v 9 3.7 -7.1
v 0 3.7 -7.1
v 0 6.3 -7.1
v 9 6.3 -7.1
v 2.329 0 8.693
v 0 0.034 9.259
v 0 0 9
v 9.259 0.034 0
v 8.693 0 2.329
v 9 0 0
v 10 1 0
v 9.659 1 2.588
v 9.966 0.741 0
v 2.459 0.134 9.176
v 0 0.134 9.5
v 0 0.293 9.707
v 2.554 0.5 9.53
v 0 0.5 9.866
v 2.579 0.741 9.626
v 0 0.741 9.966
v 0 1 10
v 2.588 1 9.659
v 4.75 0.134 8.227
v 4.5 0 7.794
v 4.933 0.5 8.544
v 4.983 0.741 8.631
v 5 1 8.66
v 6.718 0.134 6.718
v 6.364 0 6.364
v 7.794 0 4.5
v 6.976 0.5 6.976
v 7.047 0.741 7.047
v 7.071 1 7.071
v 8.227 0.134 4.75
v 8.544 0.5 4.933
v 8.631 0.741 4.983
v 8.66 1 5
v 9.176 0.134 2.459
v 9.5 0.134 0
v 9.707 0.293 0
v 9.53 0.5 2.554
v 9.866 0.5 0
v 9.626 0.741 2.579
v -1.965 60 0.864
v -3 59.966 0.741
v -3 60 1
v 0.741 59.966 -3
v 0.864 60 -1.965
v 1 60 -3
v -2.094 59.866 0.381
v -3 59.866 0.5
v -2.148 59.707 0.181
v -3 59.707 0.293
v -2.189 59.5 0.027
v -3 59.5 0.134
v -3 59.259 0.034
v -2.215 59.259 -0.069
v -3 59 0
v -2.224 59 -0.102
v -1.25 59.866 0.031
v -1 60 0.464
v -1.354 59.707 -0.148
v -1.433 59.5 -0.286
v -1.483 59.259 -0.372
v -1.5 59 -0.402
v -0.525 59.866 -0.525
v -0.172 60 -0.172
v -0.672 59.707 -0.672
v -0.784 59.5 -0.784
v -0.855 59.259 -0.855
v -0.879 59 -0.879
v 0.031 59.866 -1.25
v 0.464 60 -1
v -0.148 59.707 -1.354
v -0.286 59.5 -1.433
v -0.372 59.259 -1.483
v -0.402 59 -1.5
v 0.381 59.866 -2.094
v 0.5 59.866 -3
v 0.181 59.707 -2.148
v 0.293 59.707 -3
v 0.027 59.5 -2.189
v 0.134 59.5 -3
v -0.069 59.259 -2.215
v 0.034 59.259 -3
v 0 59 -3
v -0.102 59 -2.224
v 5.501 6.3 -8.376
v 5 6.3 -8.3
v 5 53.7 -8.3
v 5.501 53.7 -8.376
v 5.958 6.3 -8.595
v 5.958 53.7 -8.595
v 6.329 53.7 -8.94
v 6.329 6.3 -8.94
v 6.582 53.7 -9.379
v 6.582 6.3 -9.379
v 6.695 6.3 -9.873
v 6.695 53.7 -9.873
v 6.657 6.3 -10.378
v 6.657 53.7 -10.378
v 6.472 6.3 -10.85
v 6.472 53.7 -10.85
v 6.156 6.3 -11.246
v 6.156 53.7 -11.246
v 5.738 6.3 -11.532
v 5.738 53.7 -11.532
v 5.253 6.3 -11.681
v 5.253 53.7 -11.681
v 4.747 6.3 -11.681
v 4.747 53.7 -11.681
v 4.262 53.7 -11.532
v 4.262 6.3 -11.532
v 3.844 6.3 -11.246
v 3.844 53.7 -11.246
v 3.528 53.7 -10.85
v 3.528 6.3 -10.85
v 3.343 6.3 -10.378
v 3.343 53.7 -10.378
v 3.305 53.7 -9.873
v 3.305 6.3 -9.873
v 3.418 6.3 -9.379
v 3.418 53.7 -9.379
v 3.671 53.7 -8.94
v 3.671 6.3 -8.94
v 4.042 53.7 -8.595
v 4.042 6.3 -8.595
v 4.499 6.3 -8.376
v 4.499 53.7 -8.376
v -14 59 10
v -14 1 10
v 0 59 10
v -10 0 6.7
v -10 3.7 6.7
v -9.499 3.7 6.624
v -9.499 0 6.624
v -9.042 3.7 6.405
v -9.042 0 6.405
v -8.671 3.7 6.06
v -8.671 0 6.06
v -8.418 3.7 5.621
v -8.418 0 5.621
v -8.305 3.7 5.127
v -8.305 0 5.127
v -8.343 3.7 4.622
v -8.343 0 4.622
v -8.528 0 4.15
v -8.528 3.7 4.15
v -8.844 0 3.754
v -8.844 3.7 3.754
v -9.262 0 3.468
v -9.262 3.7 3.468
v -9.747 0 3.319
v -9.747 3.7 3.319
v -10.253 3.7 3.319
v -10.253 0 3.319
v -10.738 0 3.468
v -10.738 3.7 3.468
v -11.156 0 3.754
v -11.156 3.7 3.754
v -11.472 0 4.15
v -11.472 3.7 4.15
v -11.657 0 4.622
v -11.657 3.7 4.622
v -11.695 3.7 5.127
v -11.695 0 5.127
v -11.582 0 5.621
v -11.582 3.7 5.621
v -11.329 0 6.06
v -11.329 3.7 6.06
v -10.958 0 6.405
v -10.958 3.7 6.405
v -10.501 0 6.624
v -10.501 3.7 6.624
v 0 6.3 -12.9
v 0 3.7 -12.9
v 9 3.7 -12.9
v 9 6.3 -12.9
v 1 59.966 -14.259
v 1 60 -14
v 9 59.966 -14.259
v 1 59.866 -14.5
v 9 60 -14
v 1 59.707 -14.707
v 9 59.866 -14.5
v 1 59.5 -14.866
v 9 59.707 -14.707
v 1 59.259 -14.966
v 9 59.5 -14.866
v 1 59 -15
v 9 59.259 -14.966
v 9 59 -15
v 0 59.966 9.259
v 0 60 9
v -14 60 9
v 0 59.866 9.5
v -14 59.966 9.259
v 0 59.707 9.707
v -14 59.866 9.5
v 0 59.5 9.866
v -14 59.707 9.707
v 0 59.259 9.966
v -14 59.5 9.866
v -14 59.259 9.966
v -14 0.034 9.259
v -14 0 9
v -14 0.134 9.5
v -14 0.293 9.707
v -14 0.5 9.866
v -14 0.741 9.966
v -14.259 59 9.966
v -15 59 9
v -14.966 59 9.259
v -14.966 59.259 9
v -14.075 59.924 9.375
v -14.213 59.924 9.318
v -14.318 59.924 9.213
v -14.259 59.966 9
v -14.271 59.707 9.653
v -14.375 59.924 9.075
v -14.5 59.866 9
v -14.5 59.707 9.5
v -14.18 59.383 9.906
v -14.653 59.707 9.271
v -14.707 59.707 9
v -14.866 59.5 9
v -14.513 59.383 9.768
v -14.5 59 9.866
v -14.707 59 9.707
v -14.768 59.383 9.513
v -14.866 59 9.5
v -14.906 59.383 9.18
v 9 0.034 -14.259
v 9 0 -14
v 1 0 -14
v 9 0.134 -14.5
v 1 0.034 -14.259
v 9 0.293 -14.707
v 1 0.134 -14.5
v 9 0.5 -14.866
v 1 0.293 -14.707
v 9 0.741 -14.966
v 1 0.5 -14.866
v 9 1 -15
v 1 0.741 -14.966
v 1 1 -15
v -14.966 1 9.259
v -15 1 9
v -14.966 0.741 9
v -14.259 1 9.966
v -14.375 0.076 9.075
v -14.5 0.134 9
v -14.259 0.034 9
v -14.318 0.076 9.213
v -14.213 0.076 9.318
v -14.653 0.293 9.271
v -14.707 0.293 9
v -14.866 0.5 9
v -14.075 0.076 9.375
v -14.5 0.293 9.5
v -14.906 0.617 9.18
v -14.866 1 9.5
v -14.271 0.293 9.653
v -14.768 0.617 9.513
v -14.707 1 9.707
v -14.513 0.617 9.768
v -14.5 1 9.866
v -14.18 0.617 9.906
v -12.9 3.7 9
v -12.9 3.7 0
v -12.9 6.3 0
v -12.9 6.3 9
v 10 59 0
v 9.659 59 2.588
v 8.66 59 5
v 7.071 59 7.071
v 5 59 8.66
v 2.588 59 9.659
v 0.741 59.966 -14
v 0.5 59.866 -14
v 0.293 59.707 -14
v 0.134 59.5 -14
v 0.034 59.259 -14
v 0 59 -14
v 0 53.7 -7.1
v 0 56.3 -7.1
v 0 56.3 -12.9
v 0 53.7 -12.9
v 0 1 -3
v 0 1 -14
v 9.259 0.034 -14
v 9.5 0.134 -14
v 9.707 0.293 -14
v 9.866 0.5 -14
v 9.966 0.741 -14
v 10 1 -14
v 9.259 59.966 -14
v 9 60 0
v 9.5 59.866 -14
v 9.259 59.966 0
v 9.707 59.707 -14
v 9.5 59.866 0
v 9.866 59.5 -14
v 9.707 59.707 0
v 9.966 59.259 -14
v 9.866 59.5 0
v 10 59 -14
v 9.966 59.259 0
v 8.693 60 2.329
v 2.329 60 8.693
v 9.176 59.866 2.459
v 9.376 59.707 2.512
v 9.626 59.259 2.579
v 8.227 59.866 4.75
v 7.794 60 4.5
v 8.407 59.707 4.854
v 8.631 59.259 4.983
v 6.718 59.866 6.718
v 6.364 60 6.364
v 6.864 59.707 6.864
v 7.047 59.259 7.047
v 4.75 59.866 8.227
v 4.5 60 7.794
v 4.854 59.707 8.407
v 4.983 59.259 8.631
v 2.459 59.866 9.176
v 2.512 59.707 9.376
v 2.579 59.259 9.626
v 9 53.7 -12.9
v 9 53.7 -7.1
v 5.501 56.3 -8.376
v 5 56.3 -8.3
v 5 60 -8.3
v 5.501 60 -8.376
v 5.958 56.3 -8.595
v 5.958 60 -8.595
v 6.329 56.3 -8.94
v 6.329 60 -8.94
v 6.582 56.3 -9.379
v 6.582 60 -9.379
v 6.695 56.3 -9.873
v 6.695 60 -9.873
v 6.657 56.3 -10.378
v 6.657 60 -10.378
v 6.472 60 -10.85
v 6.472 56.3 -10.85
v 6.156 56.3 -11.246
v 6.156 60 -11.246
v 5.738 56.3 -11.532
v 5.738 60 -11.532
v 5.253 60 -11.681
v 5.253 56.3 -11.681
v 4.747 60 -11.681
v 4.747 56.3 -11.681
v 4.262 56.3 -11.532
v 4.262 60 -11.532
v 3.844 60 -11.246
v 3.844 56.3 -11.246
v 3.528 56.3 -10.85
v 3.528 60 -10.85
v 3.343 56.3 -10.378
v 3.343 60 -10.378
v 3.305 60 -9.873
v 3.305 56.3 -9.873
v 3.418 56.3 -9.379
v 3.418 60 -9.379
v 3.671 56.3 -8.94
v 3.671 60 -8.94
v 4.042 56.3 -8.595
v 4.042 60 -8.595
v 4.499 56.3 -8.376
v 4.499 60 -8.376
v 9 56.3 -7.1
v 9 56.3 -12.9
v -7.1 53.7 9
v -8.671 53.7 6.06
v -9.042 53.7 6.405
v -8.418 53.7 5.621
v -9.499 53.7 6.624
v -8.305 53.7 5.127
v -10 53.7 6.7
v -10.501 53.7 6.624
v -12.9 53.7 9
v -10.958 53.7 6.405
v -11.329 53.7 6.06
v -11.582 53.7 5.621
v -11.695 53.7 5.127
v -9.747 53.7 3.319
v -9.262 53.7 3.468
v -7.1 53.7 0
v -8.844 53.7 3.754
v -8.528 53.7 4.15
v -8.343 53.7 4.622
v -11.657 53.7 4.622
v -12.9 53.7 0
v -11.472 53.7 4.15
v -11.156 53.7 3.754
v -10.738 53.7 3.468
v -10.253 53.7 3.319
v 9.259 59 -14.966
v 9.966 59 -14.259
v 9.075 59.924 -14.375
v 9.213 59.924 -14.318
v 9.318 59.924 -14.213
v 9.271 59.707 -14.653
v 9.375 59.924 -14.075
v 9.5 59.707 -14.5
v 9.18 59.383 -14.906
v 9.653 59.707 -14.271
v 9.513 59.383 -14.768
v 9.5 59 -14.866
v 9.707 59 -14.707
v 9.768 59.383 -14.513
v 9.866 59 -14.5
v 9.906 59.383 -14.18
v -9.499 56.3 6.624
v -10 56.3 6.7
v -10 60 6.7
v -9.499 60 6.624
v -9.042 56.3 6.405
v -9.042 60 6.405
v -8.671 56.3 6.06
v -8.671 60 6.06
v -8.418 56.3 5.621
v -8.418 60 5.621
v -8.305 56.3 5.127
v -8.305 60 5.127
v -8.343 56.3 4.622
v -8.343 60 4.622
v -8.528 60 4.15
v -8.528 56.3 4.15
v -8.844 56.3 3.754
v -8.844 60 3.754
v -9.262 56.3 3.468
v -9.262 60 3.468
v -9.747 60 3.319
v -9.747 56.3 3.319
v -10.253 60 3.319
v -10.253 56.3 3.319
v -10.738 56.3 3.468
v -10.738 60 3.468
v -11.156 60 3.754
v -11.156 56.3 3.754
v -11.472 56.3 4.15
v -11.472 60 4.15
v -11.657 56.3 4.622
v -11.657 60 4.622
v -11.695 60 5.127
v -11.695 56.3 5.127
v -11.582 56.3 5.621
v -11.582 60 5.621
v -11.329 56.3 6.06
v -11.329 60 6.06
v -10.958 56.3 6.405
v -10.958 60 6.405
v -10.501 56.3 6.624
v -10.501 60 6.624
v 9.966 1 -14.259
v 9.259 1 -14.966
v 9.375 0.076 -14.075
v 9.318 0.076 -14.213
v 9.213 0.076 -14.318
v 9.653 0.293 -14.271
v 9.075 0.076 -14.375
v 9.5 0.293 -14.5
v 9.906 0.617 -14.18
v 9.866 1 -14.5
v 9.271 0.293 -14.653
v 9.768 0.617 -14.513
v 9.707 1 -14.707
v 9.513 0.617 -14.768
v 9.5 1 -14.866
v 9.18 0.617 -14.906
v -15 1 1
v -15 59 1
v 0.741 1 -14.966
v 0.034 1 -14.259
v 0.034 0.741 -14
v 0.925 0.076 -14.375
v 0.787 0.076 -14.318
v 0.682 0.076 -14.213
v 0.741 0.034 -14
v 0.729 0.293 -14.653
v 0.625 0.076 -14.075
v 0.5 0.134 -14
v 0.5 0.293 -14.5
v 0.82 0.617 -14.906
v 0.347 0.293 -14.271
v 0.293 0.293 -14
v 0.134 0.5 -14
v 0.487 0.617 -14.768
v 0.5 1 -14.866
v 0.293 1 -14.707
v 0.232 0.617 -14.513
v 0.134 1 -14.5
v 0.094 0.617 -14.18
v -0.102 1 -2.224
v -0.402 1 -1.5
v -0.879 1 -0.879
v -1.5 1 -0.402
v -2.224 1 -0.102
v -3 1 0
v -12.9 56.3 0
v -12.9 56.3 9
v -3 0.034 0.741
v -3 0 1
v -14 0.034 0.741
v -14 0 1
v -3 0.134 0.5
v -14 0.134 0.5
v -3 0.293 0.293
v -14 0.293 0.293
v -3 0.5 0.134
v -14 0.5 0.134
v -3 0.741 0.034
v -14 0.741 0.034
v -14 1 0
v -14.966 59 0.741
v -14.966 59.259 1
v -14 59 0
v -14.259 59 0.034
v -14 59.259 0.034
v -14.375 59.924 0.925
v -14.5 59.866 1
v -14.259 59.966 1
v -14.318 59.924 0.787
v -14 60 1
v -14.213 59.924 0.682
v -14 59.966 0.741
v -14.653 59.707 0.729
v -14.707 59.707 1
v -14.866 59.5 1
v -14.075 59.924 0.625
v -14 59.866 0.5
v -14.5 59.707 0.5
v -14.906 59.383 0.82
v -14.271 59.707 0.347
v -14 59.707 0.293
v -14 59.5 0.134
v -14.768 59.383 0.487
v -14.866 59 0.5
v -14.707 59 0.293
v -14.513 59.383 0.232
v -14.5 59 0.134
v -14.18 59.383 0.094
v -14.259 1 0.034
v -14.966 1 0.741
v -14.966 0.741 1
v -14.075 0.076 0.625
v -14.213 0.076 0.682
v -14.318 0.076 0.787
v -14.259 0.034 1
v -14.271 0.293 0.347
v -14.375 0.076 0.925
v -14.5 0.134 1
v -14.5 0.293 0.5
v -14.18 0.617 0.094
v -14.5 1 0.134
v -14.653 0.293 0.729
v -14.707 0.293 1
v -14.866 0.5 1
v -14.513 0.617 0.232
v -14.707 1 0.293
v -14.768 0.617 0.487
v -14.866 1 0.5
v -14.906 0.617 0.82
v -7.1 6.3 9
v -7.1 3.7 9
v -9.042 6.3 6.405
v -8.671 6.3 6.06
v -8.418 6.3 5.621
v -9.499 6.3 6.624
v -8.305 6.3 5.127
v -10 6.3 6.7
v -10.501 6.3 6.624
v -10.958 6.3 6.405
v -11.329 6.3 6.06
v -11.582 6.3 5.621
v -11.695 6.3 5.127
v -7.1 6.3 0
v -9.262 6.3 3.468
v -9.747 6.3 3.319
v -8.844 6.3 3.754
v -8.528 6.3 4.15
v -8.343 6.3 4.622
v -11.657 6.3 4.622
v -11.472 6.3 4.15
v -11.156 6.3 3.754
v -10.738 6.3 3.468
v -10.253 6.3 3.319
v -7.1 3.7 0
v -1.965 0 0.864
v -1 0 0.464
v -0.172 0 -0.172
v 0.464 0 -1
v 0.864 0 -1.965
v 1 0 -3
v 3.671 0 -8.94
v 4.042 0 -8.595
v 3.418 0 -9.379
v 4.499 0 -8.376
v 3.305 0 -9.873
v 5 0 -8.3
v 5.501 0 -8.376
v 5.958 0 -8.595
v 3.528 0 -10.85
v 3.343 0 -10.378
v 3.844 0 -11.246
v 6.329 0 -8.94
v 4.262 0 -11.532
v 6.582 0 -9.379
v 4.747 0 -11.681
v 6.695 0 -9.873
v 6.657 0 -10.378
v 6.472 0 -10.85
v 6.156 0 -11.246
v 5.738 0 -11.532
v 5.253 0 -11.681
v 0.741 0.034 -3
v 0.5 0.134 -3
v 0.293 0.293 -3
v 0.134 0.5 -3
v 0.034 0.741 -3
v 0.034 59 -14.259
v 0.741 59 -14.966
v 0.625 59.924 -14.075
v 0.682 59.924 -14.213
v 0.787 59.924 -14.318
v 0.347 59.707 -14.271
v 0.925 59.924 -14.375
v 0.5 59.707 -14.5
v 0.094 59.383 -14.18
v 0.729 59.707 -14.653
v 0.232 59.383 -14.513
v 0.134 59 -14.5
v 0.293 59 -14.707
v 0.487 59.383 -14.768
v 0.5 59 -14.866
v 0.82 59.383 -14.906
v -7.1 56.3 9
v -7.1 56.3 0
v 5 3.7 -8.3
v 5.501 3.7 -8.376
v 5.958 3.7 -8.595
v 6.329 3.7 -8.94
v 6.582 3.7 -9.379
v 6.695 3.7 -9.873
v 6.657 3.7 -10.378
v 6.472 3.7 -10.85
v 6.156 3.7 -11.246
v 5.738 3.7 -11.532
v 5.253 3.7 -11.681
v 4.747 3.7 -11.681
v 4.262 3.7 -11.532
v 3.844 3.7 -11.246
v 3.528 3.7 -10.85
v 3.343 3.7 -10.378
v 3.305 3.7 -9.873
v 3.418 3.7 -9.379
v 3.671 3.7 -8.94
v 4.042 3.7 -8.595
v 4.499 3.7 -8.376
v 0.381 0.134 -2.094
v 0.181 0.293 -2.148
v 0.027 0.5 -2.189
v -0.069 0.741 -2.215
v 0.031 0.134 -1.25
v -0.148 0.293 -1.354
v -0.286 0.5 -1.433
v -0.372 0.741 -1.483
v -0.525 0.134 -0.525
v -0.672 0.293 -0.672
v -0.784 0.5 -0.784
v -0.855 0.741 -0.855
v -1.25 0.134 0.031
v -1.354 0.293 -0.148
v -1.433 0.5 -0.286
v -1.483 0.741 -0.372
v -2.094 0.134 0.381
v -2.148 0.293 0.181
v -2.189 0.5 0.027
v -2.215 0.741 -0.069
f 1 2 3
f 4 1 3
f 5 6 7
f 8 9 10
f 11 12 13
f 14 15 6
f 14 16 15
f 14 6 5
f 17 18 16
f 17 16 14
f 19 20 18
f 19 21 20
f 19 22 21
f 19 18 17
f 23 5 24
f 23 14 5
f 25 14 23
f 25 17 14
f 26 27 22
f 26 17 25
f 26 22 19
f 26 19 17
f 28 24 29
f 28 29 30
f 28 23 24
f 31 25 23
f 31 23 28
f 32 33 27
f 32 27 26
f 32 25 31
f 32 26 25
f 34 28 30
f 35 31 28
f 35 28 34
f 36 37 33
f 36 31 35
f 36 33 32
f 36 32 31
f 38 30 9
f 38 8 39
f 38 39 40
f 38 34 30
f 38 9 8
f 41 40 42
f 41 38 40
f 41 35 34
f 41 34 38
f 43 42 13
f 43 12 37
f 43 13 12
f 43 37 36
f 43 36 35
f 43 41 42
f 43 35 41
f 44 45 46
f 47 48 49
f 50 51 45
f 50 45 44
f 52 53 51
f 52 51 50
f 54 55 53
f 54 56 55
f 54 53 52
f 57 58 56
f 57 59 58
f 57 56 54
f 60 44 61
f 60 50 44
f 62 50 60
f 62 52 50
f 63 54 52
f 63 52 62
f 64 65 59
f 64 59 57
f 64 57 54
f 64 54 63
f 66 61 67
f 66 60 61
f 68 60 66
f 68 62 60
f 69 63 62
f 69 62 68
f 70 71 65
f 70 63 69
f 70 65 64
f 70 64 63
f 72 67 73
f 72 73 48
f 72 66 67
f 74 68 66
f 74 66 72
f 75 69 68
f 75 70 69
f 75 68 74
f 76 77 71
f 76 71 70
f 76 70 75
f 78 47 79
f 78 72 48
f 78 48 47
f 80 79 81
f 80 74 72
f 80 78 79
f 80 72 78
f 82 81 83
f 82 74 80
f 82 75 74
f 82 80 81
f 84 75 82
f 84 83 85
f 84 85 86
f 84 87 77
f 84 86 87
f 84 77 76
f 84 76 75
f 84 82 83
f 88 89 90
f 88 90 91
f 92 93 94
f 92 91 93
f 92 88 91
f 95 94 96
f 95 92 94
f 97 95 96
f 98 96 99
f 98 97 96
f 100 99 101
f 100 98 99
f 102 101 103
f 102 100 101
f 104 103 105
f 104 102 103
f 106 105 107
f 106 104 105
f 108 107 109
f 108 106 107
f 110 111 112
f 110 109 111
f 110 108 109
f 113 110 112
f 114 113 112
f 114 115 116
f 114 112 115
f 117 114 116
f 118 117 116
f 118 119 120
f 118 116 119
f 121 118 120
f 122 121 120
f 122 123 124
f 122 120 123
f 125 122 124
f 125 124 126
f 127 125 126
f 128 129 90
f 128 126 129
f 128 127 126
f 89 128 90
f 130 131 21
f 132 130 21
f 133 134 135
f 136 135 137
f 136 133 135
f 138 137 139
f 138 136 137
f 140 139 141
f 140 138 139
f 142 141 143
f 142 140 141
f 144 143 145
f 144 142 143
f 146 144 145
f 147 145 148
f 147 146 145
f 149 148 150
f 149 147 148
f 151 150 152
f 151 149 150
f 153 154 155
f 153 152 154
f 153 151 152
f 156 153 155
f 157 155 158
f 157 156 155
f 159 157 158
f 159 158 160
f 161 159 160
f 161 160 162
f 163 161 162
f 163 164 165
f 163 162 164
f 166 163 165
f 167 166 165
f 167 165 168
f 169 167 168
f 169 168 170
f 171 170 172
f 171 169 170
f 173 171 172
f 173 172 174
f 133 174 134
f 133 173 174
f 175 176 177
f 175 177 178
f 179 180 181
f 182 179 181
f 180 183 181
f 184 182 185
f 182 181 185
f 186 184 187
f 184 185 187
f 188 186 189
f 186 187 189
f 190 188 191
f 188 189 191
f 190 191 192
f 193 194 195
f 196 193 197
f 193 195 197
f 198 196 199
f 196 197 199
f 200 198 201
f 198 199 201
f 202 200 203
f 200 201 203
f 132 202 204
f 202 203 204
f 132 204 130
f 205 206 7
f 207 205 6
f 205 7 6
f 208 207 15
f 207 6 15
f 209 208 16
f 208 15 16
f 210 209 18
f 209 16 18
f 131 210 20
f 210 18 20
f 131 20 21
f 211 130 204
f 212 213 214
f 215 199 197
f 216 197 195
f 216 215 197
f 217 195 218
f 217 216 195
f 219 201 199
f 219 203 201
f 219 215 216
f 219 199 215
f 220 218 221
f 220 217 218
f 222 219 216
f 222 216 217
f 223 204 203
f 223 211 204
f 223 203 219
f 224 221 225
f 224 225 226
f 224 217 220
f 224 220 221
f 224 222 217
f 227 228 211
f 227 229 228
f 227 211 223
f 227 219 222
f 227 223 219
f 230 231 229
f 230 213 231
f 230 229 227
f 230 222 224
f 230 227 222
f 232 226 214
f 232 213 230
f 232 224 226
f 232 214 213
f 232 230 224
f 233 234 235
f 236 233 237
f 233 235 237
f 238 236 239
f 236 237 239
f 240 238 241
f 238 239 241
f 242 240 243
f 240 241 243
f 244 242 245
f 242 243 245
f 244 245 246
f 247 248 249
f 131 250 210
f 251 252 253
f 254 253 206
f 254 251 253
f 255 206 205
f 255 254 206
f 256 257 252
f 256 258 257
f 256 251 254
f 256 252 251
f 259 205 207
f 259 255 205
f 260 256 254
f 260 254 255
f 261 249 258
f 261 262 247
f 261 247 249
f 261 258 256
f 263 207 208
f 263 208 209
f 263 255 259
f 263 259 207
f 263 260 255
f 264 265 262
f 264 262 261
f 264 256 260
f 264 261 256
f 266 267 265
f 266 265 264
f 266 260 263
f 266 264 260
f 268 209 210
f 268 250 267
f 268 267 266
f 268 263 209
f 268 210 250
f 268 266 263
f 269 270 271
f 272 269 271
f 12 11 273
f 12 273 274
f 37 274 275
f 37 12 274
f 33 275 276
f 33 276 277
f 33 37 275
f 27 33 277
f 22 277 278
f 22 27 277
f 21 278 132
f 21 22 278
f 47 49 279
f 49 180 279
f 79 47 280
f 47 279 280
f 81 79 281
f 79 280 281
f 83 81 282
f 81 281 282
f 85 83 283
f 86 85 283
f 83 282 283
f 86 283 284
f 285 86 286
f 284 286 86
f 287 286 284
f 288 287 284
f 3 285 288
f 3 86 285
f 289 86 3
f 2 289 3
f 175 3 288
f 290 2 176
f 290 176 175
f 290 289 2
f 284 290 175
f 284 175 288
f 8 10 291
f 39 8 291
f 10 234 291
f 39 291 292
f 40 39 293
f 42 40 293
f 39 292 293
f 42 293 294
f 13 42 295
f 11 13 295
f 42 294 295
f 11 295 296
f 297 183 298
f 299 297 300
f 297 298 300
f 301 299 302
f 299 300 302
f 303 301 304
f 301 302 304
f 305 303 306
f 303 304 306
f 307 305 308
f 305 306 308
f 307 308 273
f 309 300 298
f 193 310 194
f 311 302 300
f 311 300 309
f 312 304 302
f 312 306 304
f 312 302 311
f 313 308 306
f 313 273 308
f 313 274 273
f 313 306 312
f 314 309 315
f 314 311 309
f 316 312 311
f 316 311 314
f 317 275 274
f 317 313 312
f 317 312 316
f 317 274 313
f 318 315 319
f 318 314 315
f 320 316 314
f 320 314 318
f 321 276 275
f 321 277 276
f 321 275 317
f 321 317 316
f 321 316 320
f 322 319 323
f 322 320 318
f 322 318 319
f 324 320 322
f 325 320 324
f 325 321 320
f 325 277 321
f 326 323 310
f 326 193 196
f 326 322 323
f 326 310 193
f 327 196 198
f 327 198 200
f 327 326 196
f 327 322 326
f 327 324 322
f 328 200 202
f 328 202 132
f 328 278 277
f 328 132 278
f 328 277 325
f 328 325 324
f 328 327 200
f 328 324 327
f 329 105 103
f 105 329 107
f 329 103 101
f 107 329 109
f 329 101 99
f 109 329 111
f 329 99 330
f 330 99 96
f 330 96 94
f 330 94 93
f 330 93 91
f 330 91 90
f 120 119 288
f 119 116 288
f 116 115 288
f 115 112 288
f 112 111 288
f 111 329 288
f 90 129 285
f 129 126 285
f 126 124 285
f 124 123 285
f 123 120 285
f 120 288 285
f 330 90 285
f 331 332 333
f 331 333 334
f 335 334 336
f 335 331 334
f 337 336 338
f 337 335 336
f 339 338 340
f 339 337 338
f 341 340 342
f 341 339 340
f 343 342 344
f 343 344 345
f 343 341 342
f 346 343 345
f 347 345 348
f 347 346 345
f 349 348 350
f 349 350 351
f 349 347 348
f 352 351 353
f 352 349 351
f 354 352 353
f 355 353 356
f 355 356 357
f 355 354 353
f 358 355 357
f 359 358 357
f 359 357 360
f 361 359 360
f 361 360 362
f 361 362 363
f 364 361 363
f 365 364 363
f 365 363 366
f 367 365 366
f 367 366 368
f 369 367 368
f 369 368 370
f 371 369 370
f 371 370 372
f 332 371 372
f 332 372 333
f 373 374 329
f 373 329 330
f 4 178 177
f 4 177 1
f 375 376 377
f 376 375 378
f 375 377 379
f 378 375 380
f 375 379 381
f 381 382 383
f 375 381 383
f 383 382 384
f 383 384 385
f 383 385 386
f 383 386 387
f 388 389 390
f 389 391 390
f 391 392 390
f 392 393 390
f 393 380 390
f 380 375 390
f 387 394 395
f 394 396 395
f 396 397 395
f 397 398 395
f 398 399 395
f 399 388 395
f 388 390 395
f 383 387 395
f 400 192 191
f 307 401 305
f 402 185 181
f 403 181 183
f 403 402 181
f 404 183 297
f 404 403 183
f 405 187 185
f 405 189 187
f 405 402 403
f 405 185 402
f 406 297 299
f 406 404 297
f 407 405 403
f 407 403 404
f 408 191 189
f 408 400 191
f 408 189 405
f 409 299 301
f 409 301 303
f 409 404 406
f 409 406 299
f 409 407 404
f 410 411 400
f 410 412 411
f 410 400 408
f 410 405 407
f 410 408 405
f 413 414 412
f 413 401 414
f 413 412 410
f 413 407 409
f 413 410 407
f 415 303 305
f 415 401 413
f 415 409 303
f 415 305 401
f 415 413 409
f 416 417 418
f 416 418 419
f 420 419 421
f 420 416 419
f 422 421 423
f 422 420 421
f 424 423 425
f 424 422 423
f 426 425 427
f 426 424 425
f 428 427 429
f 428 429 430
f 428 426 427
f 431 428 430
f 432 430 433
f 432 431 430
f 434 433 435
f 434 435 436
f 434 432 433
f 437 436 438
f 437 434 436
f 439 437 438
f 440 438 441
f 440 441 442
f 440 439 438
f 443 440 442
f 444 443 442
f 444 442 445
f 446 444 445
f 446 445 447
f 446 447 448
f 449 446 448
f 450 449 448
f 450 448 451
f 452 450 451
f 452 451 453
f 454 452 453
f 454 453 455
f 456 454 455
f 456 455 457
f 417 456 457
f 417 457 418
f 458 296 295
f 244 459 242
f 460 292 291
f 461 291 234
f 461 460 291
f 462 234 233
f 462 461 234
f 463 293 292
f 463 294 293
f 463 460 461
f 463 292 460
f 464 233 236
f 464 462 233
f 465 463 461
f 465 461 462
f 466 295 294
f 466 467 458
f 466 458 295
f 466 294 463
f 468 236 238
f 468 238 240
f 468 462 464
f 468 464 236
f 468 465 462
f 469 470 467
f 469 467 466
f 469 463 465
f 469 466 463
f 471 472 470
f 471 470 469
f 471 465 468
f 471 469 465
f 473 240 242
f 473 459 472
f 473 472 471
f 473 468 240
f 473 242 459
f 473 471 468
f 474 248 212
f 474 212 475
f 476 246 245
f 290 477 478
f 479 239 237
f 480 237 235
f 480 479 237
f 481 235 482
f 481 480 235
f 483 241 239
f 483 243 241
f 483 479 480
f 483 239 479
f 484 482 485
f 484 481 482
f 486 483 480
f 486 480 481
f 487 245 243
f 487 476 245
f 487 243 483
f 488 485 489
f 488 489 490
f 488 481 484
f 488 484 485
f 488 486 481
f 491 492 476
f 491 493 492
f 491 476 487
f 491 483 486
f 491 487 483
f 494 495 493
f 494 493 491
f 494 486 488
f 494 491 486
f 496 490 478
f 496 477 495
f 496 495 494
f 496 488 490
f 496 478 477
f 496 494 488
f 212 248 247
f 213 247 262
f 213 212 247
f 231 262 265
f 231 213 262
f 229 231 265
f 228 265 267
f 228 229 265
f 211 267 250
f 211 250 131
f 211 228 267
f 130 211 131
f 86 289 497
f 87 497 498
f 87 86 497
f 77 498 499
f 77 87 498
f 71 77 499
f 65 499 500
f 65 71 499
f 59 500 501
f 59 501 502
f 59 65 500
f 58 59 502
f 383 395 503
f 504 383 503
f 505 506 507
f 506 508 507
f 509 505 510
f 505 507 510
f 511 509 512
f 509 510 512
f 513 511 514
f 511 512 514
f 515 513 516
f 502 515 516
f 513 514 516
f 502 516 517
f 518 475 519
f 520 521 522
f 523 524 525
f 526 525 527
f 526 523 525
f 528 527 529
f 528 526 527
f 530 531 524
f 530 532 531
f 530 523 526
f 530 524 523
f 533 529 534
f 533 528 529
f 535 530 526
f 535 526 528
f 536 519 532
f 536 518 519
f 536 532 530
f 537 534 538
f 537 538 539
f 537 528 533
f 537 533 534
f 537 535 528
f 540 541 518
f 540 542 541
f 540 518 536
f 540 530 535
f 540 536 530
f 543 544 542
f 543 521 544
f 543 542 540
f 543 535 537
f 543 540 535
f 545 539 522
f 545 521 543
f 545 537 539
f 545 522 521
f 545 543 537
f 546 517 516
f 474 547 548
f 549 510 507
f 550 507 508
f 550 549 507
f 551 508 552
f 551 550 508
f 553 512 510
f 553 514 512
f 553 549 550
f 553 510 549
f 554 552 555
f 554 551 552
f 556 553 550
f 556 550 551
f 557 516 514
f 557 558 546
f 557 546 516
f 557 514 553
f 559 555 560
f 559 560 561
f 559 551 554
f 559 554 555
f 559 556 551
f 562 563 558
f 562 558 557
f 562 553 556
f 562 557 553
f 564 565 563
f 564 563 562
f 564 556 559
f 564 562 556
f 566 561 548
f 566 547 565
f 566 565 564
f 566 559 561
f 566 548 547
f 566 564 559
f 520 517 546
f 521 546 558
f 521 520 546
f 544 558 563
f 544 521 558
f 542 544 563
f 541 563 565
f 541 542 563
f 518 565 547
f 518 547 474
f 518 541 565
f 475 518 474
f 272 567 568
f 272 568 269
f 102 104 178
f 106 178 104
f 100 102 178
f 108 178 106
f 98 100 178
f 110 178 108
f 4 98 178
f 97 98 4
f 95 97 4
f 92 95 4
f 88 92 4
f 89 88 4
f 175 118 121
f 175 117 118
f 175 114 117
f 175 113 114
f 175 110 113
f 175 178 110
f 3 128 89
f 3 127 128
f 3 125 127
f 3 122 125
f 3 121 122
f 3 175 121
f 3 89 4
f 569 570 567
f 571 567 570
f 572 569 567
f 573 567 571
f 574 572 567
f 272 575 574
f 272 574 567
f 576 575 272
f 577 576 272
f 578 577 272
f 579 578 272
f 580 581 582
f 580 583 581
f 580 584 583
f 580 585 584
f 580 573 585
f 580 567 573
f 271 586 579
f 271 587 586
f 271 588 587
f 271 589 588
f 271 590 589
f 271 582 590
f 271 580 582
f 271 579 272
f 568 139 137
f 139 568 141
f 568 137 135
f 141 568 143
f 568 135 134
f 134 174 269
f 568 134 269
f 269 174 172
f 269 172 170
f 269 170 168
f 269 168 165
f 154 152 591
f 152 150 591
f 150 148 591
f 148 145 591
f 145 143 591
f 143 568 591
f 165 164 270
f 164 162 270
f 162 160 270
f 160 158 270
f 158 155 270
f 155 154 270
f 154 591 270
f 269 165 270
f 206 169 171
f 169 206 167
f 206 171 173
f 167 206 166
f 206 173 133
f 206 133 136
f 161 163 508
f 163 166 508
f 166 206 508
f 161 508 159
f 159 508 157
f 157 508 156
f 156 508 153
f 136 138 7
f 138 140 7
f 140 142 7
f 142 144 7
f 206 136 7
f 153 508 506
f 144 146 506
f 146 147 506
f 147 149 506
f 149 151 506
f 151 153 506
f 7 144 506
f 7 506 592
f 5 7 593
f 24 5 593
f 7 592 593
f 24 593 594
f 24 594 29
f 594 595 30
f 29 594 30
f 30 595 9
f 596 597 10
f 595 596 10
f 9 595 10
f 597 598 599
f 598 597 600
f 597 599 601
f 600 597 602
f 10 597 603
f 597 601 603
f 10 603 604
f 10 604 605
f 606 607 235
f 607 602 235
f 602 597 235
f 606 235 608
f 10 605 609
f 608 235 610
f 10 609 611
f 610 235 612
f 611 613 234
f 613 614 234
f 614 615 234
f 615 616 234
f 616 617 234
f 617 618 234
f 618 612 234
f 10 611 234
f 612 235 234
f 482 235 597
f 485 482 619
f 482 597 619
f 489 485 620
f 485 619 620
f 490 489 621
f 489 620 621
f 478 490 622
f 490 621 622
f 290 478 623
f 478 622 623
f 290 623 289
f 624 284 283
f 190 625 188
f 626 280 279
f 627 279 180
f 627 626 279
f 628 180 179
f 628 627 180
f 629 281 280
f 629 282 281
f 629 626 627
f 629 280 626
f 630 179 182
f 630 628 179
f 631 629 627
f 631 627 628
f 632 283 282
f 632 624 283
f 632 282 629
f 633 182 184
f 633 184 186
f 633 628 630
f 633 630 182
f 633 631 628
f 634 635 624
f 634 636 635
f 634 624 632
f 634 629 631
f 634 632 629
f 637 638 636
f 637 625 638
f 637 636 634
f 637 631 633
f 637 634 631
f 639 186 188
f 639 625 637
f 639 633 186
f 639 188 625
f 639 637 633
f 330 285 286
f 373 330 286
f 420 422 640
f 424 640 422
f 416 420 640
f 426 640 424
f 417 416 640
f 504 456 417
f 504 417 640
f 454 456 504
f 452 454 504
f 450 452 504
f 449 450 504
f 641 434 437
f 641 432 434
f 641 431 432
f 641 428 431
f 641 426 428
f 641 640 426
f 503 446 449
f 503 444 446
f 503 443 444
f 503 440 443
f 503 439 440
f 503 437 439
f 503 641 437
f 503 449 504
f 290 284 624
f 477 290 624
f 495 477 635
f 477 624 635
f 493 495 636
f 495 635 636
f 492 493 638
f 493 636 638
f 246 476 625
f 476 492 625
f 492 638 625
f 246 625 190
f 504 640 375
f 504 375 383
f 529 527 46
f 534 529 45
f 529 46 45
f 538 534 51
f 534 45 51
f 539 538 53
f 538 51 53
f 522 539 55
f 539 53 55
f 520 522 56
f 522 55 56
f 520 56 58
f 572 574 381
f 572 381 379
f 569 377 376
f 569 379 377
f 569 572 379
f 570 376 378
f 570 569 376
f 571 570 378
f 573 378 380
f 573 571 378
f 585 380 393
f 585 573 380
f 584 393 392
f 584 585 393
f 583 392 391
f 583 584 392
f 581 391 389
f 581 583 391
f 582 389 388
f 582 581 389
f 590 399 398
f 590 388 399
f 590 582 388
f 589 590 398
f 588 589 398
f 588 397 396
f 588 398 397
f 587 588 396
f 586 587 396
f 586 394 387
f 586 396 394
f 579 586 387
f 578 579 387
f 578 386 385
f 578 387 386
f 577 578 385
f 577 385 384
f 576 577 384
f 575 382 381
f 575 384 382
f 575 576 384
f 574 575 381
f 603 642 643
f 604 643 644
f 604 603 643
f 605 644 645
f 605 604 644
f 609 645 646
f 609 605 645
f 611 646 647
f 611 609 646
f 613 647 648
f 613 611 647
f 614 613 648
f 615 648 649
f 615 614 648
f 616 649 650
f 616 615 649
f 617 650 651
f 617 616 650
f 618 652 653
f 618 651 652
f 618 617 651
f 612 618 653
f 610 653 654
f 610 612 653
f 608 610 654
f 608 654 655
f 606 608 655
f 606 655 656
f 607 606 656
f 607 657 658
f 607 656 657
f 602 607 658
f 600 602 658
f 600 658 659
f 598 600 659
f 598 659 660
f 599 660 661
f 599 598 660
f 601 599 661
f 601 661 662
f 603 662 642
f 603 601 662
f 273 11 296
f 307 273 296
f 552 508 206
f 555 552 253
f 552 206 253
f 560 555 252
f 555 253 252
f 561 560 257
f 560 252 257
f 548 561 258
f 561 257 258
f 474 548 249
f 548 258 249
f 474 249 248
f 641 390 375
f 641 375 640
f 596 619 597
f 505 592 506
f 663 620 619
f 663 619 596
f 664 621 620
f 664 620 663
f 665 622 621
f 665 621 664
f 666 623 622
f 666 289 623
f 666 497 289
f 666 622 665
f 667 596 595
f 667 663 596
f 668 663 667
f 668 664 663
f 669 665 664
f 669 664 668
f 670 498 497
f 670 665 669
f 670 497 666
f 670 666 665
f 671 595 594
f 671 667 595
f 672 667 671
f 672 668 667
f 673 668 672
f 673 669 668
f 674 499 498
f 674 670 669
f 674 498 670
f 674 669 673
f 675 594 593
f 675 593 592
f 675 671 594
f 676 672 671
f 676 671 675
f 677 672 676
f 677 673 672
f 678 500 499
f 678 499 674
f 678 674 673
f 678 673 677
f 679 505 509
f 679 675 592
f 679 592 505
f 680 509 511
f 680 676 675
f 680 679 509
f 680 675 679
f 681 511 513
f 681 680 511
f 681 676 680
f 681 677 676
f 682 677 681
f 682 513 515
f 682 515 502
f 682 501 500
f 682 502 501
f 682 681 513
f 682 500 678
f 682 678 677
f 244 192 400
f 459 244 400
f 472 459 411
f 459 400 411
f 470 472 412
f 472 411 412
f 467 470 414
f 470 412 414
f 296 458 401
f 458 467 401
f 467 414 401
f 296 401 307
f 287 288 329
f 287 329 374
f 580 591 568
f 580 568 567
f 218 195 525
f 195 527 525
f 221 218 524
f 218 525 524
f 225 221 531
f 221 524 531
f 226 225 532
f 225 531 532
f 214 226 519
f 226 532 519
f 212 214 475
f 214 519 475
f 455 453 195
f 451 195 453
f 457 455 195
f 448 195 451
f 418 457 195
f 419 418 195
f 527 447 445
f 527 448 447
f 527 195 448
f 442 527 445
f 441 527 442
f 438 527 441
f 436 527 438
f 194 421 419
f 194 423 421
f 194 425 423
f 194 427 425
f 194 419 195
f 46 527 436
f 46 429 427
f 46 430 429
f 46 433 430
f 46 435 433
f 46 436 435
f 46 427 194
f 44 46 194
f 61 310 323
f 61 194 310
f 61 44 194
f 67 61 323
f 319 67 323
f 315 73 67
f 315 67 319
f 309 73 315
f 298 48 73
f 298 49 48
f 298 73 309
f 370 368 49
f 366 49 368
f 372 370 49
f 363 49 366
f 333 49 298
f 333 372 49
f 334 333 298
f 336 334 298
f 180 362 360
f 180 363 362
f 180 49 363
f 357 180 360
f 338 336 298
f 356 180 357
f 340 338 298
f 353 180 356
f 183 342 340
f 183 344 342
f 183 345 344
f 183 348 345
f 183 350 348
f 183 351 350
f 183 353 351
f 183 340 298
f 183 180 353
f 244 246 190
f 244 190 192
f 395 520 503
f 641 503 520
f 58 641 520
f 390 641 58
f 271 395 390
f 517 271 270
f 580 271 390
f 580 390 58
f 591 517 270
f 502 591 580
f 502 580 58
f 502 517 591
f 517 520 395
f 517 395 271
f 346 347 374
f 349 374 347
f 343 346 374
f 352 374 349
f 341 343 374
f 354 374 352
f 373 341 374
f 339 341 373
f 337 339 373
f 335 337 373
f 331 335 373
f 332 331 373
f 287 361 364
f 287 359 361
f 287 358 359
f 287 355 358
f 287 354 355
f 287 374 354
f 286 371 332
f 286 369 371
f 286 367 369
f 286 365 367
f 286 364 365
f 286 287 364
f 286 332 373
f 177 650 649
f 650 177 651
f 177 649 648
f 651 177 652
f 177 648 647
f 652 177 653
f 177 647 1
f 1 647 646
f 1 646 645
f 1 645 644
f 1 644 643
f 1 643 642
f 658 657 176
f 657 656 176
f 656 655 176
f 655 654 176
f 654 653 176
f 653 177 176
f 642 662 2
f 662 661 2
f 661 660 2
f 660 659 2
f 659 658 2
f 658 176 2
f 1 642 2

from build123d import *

# Parameters (mm, degrees)
SKETCH1_W           = 15
SKETCH1_H           = 10
SKETCH1_R           = 1.7
SKETCH1_W_2         = 10
SKETCH1_H_2         = 15
BOSS_EXTRUDE1_DEPTH = 60
SKETCH2_W           = 5.8
SKETCH2_H           = 2.6
CUT_EXTRUDE1_DEPTH  = 9
SKETCH3_W           = 5.8
SKETCH3_H           = 2.6
CUT_EXTRUDE2_DEPTH  = 9
FILLET1_R           = 1
FILLET3_R           = 3
FILLET4_R           = 1


with BuildPart() as part:
    # Sketch1 → Boss-Extrude1 (new body)
    # profile 1 of 3: a face of its own
    with BuildSketch(Plane(origin=(0, 0, 0), x_dir=(1, 0, 0), z_dir=(0, 1, 0))):
        with Locations((-7.5, -5)):
            Rectangle(SKETCH1_W, SKETCH1_H)
        with Locations(Location((-10, -5, 0), (0, 0, 270))):
            Circle(SKETCH1_R, mode=Mode.SUBTRACT)
    # profile 2 of 3: a face of its own
    with BuildSketch(Plane(origin=(0, 0, 0), x_dir=(1, 0, 0), z_dir=(0, 1, 0))):
        with BuildLine():
            ThreePointArc((10, 0), (7.071067812, -7.071067812), (0, -10))
            Line((0, -10), (0, 0))
            Line((0, 0), (10, 0))
        make_face()
    # profile 3 of 3: a face of its own
    with BuildSketch(Plane(origin=(0, 0, 0), x_dir=(1, 0, 0), z_dir=(0, 1, 0))):
        with Locations((5, 7.5)):
            Rectangle(SKETCH1_W_2, SKETCH1_H_2)
        with Locations(Location((5, 10, 0), (0, 0, 270))):
            Circle(SKETCH1_R, mode=Mode.SUBTRACT)
    extrude(amount=BOSS_EXTRUDE1_DEPTH)

    # Sketch2 → Cut-Extrude1 (cut)
    with BuildSketch(Plane.ZY):
        with Locations((-10, 55)):
            Rectangle(SKETCH2_W, SKETCH2_H)
        with Locations((-10, 5)):
            Rectangle(SKETCH2_W, SKETCH2_H)
    extrude(amount=-CUT_EXTRUDE1_DEPTH, mode=Mode.SUBTRACT)

    # Sketch3 → Cut-Extrude2 (cut)
    with BuildSketch(Plane(origin=(0, 0, 0), x_dir=(-1, 0, 0), z_dir=(0, 0, -1))):
        with Locations((10, 55)):
            Rectangle(SKETCH3_W, SKETCH3_H)
        with Locations((10, 5)):
            Rectangle(SKETCH3_W, SKETCH3_H)
    extrude(amount=-CUT_EXTRUDE2_DEPTH, mode=Mode.SUBTRACT)

    # Fillet1
    fillet1_edges = [part.edges().sort_by_distance(p)[0] for p in [
        (0, 30, -15),
        (10, 30, -15),
        (-15, 30, 10),
        (-15, 30, 0),
    ]]
    fillet(fillet1_edges, radius=FILLET1_R)

    # Fillet3
    fillet3_edges = [part.edges().sort_by_distance(p)[0] for p in [
        (0, 30, 0),
    ]]
    fillet(fillet3_edges, radius=FILLET3_R)

    # Fillet4
    fillet4_edges = [part.edges().sort_by_distance(p)[0] for p in [
        (10, 0, -7),
        (5, 0, -15),
        (-15, 0, 5),
        (9.707106781, 0, -14.707106781),
        (0.292893219, 0, -14.707106781),
        (-14.707106781, 0, 0.292893219),
        (7.071067812, 0, 7.071067812),
        (-14.707106781, 0, 9.707106781),
        (-15, 60, 5),
        (5, 60, -15),
        (9.707106781, 60, -14.707106781),
        (-7, 0, 10),
        (0.292893219, 60, -14.707106781),
        (-14.707106781, 60, 0.292893219),
        (-14.707106781, 60, 9.707106781),
        (-8.5, 0, 0),
        (-8.5, 60, 0),
        (0, 60, -8.5),
        (0, 0, -8.5),
        (-0.878679656, 0, -0.878679656),
        (-0.878679656, 60, -0.878679656),
        (-7, 60, 10),
        (7.071067812, 60, 7.071067812),
        (10, 60, -7),
    ]]
    fillet(fillet4_edges, radius=FILLET4_R)


solid = part.part
